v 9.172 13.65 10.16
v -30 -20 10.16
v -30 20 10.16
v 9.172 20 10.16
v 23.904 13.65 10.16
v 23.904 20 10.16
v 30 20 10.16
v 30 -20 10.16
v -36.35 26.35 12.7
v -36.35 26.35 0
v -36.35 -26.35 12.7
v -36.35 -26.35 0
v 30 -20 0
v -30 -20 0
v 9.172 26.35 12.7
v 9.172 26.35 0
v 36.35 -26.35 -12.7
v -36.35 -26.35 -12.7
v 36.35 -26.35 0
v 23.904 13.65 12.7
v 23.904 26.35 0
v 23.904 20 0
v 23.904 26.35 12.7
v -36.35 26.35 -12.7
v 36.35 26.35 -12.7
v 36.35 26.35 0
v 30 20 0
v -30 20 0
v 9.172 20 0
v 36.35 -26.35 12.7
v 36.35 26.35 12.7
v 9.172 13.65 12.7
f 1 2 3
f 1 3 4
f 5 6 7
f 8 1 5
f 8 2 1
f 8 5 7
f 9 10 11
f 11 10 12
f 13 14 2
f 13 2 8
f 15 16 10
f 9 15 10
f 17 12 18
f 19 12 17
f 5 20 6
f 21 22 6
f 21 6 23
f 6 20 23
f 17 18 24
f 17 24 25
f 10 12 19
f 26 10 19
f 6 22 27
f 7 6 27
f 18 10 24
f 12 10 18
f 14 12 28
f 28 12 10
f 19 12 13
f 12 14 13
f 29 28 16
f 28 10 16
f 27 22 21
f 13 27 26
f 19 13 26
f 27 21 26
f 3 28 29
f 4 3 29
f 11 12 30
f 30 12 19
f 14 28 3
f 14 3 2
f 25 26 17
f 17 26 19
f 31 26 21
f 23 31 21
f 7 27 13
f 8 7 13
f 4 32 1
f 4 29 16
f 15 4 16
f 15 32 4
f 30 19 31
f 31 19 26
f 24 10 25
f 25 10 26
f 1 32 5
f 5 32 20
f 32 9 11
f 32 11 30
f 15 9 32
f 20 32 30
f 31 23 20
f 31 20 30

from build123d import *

# Parameters (mm, degrees)
F1_DEPTH = 12.7
F2_W     = 59.99988
F2_H     = 39.99992
F3_DEPTH = 10.16
F4_W     = 14.732
F4_H     = 12.7
F5_DEPTH = 12.7
F6_W     = 72.69988
F6_H     = 52.69992
F7_DEPTH = 12.7


with BuildPart() as f1:
    # F0 (on Top) → F1 (new body)
    with BuildSketch(Plane.XY):
        Polygon((36.34994, 26.34996), (29.99994, 26.34996), (-29.99994, 26.34996), (-36.34994, 26.34996), (-36.34994, -26.34996), (36.34994, -26.34996), align=None)
    extrude(amount=F1_DEPTH)

    # F2 (on face) → F3 (cut, through all)
    with BuildSketch(Plane(origin=(0, 0, 0), x_dir=(1, 0, 0), z_dir=(0, 0, -1))):
        Rectangle(F2_W, F2_H)
    extrude(amount=-F3_DEPTH, mode=Mode.SUBTRACT)

    # F4 (on face) → F5 (cut, through all)
    with BuildSketch(Plane.XY.offset(12.7)):
        with Locations((16.53794, 19.99996)):
            Rectangle(F4_W, F4_H)
    extrude(amount=-F5_DEPTH, mode=Mode.SUBTRACT)


with BuildPart() as f7:
    # F6 (on face) → F7 (new body)
    with BuildSketch(Plane(origin=(0, 0, 0), x_dir=(1, 0, 0), z_dir=(0, 0, -1))):
        Rectangle(F6_W, F6_H)
    extrude(amount=F7_DEPTH)


solid = Compound([f1.part, f7.part])
